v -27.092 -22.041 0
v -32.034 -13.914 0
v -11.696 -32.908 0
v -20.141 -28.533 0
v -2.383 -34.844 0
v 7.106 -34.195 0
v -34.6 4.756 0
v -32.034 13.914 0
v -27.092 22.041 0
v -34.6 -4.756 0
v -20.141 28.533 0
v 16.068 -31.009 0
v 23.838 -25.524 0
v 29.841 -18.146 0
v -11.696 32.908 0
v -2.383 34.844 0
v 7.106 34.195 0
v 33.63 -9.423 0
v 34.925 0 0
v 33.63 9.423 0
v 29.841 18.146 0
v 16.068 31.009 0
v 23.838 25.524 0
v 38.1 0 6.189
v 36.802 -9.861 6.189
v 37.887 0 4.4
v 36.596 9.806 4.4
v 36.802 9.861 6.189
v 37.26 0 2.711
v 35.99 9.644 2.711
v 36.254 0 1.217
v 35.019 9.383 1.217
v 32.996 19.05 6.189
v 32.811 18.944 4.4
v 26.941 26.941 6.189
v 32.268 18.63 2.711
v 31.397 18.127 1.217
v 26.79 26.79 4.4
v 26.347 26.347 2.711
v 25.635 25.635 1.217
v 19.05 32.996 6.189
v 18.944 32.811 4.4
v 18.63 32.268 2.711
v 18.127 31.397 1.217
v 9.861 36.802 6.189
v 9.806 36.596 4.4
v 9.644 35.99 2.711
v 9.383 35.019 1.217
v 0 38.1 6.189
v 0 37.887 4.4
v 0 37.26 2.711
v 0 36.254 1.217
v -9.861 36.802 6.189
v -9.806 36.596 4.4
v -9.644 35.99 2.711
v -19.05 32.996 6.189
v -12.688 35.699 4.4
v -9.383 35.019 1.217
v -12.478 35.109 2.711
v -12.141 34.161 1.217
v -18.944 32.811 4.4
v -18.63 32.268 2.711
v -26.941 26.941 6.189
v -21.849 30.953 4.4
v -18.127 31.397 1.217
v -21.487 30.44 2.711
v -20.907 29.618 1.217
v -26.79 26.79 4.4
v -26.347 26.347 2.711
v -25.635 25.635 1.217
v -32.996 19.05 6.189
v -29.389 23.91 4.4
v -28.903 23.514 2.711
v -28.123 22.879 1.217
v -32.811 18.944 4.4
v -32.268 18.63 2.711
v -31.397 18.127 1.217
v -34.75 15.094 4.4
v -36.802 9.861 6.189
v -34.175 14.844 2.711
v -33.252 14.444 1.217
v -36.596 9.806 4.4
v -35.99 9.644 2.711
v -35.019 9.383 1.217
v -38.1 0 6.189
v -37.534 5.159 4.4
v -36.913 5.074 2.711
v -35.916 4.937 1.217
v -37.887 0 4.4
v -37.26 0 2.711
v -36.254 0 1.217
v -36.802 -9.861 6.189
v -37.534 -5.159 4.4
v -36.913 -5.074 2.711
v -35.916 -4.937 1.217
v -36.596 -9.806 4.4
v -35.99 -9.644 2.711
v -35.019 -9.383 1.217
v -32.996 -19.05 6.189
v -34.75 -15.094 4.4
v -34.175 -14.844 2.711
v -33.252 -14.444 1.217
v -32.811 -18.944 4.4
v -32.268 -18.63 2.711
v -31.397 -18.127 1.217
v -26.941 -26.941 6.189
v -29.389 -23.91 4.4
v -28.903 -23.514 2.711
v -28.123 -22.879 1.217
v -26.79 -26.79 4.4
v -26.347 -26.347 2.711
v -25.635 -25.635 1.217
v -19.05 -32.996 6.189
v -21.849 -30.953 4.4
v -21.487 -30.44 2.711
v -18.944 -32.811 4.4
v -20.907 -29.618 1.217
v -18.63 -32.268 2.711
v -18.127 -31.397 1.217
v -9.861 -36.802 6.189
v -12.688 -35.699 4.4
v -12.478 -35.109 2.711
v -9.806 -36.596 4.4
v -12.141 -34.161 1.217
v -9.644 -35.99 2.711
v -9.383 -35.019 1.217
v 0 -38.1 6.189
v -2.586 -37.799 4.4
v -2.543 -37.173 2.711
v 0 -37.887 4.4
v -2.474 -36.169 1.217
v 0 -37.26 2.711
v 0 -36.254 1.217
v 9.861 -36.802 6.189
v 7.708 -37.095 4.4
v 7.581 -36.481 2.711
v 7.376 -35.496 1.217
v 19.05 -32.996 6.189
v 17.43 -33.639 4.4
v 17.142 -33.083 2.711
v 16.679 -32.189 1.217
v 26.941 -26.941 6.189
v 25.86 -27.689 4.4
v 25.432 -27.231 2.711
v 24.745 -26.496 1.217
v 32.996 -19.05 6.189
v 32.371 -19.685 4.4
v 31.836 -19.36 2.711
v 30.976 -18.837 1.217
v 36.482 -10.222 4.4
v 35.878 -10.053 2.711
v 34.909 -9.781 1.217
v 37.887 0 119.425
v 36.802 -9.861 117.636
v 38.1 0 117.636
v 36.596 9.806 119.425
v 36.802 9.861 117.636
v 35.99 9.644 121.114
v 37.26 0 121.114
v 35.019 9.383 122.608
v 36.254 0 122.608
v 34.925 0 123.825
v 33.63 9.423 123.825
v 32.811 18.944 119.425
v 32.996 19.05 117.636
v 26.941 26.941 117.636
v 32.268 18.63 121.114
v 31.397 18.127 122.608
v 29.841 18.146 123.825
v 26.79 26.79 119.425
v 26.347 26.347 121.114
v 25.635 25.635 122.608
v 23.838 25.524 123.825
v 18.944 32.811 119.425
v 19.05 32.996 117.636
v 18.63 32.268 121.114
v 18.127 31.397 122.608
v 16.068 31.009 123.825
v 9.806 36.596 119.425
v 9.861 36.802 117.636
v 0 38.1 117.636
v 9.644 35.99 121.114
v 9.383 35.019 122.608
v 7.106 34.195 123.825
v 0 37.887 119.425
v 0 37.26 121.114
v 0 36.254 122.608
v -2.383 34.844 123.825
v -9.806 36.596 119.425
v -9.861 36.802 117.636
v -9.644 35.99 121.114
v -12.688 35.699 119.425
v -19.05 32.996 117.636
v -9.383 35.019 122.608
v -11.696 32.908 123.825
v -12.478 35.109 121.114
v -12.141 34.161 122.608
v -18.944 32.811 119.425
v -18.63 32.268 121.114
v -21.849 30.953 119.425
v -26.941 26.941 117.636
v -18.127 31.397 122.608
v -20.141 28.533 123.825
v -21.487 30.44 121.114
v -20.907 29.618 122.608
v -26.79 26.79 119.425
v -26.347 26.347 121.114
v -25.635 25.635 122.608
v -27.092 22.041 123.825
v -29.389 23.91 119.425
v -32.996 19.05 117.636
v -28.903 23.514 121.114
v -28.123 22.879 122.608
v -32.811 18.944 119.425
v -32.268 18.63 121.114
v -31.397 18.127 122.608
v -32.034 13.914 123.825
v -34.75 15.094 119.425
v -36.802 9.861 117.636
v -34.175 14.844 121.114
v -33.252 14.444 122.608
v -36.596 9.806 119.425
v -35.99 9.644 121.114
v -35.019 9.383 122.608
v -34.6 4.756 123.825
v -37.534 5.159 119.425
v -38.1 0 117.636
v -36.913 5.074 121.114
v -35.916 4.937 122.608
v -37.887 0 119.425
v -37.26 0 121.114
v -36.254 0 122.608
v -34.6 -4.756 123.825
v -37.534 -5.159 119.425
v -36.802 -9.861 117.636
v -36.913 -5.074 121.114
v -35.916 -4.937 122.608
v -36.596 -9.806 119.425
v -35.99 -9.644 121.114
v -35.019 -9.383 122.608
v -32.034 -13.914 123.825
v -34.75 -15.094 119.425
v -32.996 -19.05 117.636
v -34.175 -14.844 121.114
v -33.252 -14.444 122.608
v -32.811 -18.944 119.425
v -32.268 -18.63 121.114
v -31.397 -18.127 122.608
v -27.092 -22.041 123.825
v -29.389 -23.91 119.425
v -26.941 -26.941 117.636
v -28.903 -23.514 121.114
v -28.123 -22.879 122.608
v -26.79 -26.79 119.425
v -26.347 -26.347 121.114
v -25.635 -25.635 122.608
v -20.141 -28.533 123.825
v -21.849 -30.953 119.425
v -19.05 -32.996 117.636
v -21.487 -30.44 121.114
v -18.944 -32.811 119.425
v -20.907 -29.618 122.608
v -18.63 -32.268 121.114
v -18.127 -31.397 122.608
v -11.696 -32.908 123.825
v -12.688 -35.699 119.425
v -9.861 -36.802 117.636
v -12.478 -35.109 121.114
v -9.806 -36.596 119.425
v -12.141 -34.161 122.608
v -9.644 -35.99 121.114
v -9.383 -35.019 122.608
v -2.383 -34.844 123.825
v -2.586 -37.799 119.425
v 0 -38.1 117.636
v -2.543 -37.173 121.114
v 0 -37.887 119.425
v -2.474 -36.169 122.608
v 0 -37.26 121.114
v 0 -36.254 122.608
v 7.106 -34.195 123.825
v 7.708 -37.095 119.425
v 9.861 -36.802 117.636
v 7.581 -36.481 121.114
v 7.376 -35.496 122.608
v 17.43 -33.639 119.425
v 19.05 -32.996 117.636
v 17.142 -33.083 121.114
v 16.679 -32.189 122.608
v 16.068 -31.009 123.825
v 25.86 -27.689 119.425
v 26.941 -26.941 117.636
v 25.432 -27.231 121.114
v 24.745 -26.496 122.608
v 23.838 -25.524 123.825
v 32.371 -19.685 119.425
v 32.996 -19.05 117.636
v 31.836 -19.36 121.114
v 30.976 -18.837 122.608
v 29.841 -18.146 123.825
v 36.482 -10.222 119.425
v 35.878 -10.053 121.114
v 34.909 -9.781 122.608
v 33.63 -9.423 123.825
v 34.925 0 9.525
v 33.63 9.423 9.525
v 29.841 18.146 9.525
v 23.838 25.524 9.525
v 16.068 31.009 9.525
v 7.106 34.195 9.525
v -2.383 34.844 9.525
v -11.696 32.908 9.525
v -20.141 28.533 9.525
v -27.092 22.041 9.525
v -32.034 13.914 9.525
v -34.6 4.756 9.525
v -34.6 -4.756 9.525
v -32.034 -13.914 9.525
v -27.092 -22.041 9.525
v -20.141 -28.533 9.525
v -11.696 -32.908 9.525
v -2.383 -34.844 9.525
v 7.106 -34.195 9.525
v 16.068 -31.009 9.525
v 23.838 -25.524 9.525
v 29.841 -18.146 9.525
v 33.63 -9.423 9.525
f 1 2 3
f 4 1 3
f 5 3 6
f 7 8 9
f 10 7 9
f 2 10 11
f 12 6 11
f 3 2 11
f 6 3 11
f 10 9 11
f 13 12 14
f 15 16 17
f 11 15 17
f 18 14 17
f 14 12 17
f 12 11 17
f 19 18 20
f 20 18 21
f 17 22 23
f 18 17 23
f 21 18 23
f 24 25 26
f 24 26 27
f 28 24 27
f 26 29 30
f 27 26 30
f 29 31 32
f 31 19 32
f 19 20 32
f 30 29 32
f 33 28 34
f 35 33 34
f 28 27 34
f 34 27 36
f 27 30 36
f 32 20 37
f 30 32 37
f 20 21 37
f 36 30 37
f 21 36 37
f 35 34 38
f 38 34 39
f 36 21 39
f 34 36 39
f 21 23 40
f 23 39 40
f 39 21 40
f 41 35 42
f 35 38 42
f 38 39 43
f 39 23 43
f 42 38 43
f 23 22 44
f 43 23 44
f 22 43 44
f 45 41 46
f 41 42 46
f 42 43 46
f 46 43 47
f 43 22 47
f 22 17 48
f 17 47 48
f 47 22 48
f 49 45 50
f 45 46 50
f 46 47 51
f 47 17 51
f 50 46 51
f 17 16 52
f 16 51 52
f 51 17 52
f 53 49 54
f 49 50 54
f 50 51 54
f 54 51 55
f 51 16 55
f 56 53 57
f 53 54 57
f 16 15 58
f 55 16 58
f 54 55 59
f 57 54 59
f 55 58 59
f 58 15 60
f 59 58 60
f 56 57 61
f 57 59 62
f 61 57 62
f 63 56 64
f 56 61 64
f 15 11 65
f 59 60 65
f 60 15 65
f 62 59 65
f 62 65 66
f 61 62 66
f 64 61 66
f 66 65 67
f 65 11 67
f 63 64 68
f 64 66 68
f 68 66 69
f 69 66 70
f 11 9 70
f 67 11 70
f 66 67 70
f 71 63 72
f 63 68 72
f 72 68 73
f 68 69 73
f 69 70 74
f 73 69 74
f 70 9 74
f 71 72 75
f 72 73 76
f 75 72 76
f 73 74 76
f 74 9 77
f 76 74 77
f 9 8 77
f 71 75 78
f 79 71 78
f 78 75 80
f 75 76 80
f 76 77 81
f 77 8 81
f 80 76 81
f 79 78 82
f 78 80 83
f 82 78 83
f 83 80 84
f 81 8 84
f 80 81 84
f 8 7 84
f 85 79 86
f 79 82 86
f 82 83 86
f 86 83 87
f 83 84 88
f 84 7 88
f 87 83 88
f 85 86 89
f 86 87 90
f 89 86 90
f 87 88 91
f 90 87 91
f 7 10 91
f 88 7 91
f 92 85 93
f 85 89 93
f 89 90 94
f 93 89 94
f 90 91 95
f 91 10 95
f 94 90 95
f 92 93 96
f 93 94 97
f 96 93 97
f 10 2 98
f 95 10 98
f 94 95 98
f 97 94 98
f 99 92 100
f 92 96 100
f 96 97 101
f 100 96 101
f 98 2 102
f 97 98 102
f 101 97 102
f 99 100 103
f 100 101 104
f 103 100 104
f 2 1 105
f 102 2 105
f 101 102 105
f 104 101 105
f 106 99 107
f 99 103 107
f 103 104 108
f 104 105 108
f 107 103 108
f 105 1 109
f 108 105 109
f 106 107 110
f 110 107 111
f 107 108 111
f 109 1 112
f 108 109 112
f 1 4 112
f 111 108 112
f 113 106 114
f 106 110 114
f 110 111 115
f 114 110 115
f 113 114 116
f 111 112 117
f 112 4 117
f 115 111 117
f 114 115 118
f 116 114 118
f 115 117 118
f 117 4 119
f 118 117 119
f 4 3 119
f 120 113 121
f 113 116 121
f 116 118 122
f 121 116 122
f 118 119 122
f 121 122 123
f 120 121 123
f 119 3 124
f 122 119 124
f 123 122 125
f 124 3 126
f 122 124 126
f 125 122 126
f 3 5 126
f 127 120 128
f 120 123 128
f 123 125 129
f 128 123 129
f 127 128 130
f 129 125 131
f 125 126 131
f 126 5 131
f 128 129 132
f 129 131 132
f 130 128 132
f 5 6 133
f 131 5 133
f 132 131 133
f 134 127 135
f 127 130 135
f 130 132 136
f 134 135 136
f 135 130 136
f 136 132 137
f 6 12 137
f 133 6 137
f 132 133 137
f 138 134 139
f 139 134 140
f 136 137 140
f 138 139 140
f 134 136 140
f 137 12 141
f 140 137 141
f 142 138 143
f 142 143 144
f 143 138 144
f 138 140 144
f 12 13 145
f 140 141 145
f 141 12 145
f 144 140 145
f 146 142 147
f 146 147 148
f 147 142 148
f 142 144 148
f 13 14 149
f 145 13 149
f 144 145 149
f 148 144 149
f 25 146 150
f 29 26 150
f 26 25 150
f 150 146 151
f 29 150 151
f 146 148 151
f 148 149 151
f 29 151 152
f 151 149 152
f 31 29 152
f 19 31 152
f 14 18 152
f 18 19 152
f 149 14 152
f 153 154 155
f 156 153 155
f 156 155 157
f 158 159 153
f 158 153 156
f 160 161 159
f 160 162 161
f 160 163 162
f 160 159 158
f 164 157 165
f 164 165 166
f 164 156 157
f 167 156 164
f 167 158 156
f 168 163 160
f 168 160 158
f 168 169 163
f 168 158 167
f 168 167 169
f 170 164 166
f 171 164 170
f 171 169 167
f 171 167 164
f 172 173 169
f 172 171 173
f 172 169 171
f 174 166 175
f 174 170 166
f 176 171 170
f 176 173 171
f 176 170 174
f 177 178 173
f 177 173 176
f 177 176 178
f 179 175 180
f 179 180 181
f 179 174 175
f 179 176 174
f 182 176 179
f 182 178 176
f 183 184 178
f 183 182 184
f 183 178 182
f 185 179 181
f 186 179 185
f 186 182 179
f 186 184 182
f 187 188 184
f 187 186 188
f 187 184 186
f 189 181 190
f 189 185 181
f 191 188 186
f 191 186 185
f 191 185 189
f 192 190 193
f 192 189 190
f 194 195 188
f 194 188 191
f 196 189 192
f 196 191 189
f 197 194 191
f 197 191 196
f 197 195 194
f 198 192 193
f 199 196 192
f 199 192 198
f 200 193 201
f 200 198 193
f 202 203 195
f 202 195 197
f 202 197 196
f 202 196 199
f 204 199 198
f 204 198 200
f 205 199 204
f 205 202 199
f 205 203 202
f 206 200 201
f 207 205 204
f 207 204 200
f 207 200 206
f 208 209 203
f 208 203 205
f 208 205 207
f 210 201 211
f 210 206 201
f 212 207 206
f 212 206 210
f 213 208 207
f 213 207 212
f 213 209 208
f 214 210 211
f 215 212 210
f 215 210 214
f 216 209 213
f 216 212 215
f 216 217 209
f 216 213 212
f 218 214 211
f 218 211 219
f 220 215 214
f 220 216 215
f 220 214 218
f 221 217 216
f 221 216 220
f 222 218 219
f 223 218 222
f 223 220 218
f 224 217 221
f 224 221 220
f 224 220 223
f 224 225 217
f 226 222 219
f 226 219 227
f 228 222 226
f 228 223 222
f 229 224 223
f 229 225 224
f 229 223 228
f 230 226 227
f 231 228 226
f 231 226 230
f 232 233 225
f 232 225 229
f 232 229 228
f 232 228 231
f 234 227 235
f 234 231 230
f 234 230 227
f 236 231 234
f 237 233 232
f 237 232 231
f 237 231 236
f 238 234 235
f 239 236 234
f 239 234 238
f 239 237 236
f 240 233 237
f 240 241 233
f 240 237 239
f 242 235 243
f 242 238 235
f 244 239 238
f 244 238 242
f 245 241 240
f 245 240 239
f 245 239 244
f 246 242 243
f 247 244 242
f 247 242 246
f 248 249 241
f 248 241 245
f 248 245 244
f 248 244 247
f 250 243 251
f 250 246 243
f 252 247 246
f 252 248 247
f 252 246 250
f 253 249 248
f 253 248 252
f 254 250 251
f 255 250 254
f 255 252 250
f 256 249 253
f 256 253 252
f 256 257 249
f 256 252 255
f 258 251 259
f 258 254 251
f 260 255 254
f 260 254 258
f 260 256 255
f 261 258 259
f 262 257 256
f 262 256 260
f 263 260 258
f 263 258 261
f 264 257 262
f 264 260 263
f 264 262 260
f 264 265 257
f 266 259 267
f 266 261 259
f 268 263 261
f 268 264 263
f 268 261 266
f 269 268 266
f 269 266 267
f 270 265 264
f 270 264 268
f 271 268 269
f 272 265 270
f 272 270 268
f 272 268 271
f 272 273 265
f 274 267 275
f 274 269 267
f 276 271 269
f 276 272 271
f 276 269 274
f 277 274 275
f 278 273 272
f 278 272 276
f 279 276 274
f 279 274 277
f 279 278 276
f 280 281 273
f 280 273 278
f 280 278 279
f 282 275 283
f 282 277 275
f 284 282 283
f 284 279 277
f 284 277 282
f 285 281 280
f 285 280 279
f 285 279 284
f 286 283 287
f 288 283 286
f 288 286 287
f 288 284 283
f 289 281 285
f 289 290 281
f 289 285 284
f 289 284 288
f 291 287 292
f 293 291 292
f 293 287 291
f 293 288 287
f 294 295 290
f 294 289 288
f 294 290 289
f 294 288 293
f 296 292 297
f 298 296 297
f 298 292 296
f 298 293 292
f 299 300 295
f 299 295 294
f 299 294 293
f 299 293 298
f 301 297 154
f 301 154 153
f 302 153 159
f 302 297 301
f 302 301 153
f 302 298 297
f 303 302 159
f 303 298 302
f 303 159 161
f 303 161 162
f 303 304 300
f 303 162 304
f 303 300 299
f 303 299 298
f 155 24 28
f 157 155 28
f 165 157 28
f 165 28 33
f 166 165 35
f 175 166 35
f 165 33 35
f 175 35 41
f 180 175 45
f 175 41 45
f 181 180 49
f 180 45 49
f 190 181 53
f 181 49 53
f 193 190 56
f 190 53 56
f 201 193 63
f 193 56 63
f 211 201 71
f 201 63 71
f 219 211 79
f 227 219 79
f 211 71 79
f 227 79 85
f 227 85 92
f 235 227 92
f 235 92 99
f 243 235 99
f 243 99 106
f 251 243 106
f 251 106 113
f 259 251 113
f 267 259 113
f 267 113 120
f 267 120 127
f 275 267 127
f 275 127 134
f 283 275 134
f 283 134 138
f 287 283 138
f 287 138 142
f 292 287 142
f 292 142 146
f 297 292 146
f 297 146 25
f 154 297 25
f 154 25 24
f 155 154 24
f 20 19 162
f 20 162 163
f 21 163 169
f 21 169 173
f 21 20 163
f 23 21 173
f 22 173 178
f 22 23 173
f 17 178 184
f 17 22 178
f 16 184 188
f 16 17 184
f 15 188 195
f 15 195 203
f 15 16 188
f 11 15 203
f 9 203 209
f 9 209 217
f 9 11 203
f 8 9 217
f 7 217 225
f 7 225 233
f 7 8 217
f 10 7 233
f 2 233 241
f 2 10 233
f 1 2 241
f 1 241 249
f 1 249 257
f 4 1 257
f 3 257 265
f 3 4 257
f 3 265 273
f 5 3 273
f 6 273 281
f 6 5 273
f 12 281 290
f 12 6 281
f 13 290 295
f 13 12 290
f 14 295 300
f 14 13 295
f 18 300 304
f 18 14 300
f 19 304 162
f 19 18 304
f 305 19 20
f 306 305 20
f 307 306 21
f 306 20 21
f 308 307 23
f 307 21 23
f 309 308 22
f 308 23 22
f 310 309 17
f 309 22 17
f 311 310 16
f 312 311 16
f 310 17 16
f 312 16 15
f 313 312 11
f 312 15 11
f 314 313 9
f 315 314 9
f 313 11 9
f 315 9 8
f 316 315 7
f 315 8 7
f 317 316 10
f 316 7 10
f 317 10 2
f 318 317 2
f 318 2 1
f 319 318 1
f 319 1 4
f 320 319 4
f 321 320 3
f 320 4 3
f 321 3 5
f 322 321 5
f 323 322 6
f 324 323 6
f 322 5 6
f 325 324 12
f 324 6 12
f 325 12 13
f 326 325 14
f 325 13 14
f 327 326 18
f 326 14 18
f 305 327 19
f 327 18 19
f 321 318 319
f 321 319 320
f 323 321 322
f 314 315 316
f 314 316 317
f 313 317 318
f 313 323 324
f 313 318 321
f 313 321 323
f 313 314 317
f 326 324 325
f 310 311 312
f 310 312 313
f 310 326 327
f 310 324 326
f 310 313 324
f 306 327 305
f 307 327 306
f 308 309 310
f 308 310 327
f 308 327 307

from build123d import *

# Parameters (mm, degrees)
F0_R     = 38.1
F0_R_2   = 34.925
F1_DEPTH = 123.825
F2_DEPTH = 9.525


# Not quite as in the source:
# - a fillet or chamfer that OpenCascade refuses, or shapes differently, is made with other operations: its cross-section is extruded or revolved along the edge and cut away or added


with BuildPart() as f1:
    # F0 (on Top) → F1 (new body)
    with BuildSketch(Plane.XY):
        Circle(F0_R)
        Circle(F0_R_2, mode=Mode.SUBTRACT)
    extrude(amount=F1_DEPTH)

    # F3: fillet of radius 7.62 on 1 edges, made by hand

    # F3_s1 → F3_t2 (revolve, cut)
    with BuildSketch(Plane.XZ):
        with BuildLine():
            ThreePointArc((38.1, 117.635785591), (37.25994469, 121.1138238312), (34.925, 123.825))
            Line((34.925, 123.825), (38.1, 123.825))
            Line((38.1, 123.825), (38.1, 117.635785591))
        make_face()
    revolve(axis=Axis((0, 0, 123.825), (0, 0, 1)), mode=Mode.SUBTRACT)

    # F4: fillet of radius 7.62 on 1 edges, made by hand

    # F4_s1 → F4_t2 (revolve, cut)
    with BuildSketch(Plane.XZ):
        with BuildLine():
            ThreePointArc((38.1, 6.189214409), (37.25994469, 2.7111761688), (34.925, 0))
            Line((34.925, 0), (38.1, 0))
            Line((38.1, 0), (38.1, 6.189214409))
        make_face()
    revolve(axis=Axis((0, 0, 0), (0, 0, 1)), mode=Mode.SUBTRACT)


with BuildPart() as f2:
    # F0 (on Top) → F2 (new body)
    with BuildSketch(Plane.XY):
        Circle(F0_R_2)
    extrude(amount=F2_DEPTH)


solid = Compound([f1.part, f2.part])
